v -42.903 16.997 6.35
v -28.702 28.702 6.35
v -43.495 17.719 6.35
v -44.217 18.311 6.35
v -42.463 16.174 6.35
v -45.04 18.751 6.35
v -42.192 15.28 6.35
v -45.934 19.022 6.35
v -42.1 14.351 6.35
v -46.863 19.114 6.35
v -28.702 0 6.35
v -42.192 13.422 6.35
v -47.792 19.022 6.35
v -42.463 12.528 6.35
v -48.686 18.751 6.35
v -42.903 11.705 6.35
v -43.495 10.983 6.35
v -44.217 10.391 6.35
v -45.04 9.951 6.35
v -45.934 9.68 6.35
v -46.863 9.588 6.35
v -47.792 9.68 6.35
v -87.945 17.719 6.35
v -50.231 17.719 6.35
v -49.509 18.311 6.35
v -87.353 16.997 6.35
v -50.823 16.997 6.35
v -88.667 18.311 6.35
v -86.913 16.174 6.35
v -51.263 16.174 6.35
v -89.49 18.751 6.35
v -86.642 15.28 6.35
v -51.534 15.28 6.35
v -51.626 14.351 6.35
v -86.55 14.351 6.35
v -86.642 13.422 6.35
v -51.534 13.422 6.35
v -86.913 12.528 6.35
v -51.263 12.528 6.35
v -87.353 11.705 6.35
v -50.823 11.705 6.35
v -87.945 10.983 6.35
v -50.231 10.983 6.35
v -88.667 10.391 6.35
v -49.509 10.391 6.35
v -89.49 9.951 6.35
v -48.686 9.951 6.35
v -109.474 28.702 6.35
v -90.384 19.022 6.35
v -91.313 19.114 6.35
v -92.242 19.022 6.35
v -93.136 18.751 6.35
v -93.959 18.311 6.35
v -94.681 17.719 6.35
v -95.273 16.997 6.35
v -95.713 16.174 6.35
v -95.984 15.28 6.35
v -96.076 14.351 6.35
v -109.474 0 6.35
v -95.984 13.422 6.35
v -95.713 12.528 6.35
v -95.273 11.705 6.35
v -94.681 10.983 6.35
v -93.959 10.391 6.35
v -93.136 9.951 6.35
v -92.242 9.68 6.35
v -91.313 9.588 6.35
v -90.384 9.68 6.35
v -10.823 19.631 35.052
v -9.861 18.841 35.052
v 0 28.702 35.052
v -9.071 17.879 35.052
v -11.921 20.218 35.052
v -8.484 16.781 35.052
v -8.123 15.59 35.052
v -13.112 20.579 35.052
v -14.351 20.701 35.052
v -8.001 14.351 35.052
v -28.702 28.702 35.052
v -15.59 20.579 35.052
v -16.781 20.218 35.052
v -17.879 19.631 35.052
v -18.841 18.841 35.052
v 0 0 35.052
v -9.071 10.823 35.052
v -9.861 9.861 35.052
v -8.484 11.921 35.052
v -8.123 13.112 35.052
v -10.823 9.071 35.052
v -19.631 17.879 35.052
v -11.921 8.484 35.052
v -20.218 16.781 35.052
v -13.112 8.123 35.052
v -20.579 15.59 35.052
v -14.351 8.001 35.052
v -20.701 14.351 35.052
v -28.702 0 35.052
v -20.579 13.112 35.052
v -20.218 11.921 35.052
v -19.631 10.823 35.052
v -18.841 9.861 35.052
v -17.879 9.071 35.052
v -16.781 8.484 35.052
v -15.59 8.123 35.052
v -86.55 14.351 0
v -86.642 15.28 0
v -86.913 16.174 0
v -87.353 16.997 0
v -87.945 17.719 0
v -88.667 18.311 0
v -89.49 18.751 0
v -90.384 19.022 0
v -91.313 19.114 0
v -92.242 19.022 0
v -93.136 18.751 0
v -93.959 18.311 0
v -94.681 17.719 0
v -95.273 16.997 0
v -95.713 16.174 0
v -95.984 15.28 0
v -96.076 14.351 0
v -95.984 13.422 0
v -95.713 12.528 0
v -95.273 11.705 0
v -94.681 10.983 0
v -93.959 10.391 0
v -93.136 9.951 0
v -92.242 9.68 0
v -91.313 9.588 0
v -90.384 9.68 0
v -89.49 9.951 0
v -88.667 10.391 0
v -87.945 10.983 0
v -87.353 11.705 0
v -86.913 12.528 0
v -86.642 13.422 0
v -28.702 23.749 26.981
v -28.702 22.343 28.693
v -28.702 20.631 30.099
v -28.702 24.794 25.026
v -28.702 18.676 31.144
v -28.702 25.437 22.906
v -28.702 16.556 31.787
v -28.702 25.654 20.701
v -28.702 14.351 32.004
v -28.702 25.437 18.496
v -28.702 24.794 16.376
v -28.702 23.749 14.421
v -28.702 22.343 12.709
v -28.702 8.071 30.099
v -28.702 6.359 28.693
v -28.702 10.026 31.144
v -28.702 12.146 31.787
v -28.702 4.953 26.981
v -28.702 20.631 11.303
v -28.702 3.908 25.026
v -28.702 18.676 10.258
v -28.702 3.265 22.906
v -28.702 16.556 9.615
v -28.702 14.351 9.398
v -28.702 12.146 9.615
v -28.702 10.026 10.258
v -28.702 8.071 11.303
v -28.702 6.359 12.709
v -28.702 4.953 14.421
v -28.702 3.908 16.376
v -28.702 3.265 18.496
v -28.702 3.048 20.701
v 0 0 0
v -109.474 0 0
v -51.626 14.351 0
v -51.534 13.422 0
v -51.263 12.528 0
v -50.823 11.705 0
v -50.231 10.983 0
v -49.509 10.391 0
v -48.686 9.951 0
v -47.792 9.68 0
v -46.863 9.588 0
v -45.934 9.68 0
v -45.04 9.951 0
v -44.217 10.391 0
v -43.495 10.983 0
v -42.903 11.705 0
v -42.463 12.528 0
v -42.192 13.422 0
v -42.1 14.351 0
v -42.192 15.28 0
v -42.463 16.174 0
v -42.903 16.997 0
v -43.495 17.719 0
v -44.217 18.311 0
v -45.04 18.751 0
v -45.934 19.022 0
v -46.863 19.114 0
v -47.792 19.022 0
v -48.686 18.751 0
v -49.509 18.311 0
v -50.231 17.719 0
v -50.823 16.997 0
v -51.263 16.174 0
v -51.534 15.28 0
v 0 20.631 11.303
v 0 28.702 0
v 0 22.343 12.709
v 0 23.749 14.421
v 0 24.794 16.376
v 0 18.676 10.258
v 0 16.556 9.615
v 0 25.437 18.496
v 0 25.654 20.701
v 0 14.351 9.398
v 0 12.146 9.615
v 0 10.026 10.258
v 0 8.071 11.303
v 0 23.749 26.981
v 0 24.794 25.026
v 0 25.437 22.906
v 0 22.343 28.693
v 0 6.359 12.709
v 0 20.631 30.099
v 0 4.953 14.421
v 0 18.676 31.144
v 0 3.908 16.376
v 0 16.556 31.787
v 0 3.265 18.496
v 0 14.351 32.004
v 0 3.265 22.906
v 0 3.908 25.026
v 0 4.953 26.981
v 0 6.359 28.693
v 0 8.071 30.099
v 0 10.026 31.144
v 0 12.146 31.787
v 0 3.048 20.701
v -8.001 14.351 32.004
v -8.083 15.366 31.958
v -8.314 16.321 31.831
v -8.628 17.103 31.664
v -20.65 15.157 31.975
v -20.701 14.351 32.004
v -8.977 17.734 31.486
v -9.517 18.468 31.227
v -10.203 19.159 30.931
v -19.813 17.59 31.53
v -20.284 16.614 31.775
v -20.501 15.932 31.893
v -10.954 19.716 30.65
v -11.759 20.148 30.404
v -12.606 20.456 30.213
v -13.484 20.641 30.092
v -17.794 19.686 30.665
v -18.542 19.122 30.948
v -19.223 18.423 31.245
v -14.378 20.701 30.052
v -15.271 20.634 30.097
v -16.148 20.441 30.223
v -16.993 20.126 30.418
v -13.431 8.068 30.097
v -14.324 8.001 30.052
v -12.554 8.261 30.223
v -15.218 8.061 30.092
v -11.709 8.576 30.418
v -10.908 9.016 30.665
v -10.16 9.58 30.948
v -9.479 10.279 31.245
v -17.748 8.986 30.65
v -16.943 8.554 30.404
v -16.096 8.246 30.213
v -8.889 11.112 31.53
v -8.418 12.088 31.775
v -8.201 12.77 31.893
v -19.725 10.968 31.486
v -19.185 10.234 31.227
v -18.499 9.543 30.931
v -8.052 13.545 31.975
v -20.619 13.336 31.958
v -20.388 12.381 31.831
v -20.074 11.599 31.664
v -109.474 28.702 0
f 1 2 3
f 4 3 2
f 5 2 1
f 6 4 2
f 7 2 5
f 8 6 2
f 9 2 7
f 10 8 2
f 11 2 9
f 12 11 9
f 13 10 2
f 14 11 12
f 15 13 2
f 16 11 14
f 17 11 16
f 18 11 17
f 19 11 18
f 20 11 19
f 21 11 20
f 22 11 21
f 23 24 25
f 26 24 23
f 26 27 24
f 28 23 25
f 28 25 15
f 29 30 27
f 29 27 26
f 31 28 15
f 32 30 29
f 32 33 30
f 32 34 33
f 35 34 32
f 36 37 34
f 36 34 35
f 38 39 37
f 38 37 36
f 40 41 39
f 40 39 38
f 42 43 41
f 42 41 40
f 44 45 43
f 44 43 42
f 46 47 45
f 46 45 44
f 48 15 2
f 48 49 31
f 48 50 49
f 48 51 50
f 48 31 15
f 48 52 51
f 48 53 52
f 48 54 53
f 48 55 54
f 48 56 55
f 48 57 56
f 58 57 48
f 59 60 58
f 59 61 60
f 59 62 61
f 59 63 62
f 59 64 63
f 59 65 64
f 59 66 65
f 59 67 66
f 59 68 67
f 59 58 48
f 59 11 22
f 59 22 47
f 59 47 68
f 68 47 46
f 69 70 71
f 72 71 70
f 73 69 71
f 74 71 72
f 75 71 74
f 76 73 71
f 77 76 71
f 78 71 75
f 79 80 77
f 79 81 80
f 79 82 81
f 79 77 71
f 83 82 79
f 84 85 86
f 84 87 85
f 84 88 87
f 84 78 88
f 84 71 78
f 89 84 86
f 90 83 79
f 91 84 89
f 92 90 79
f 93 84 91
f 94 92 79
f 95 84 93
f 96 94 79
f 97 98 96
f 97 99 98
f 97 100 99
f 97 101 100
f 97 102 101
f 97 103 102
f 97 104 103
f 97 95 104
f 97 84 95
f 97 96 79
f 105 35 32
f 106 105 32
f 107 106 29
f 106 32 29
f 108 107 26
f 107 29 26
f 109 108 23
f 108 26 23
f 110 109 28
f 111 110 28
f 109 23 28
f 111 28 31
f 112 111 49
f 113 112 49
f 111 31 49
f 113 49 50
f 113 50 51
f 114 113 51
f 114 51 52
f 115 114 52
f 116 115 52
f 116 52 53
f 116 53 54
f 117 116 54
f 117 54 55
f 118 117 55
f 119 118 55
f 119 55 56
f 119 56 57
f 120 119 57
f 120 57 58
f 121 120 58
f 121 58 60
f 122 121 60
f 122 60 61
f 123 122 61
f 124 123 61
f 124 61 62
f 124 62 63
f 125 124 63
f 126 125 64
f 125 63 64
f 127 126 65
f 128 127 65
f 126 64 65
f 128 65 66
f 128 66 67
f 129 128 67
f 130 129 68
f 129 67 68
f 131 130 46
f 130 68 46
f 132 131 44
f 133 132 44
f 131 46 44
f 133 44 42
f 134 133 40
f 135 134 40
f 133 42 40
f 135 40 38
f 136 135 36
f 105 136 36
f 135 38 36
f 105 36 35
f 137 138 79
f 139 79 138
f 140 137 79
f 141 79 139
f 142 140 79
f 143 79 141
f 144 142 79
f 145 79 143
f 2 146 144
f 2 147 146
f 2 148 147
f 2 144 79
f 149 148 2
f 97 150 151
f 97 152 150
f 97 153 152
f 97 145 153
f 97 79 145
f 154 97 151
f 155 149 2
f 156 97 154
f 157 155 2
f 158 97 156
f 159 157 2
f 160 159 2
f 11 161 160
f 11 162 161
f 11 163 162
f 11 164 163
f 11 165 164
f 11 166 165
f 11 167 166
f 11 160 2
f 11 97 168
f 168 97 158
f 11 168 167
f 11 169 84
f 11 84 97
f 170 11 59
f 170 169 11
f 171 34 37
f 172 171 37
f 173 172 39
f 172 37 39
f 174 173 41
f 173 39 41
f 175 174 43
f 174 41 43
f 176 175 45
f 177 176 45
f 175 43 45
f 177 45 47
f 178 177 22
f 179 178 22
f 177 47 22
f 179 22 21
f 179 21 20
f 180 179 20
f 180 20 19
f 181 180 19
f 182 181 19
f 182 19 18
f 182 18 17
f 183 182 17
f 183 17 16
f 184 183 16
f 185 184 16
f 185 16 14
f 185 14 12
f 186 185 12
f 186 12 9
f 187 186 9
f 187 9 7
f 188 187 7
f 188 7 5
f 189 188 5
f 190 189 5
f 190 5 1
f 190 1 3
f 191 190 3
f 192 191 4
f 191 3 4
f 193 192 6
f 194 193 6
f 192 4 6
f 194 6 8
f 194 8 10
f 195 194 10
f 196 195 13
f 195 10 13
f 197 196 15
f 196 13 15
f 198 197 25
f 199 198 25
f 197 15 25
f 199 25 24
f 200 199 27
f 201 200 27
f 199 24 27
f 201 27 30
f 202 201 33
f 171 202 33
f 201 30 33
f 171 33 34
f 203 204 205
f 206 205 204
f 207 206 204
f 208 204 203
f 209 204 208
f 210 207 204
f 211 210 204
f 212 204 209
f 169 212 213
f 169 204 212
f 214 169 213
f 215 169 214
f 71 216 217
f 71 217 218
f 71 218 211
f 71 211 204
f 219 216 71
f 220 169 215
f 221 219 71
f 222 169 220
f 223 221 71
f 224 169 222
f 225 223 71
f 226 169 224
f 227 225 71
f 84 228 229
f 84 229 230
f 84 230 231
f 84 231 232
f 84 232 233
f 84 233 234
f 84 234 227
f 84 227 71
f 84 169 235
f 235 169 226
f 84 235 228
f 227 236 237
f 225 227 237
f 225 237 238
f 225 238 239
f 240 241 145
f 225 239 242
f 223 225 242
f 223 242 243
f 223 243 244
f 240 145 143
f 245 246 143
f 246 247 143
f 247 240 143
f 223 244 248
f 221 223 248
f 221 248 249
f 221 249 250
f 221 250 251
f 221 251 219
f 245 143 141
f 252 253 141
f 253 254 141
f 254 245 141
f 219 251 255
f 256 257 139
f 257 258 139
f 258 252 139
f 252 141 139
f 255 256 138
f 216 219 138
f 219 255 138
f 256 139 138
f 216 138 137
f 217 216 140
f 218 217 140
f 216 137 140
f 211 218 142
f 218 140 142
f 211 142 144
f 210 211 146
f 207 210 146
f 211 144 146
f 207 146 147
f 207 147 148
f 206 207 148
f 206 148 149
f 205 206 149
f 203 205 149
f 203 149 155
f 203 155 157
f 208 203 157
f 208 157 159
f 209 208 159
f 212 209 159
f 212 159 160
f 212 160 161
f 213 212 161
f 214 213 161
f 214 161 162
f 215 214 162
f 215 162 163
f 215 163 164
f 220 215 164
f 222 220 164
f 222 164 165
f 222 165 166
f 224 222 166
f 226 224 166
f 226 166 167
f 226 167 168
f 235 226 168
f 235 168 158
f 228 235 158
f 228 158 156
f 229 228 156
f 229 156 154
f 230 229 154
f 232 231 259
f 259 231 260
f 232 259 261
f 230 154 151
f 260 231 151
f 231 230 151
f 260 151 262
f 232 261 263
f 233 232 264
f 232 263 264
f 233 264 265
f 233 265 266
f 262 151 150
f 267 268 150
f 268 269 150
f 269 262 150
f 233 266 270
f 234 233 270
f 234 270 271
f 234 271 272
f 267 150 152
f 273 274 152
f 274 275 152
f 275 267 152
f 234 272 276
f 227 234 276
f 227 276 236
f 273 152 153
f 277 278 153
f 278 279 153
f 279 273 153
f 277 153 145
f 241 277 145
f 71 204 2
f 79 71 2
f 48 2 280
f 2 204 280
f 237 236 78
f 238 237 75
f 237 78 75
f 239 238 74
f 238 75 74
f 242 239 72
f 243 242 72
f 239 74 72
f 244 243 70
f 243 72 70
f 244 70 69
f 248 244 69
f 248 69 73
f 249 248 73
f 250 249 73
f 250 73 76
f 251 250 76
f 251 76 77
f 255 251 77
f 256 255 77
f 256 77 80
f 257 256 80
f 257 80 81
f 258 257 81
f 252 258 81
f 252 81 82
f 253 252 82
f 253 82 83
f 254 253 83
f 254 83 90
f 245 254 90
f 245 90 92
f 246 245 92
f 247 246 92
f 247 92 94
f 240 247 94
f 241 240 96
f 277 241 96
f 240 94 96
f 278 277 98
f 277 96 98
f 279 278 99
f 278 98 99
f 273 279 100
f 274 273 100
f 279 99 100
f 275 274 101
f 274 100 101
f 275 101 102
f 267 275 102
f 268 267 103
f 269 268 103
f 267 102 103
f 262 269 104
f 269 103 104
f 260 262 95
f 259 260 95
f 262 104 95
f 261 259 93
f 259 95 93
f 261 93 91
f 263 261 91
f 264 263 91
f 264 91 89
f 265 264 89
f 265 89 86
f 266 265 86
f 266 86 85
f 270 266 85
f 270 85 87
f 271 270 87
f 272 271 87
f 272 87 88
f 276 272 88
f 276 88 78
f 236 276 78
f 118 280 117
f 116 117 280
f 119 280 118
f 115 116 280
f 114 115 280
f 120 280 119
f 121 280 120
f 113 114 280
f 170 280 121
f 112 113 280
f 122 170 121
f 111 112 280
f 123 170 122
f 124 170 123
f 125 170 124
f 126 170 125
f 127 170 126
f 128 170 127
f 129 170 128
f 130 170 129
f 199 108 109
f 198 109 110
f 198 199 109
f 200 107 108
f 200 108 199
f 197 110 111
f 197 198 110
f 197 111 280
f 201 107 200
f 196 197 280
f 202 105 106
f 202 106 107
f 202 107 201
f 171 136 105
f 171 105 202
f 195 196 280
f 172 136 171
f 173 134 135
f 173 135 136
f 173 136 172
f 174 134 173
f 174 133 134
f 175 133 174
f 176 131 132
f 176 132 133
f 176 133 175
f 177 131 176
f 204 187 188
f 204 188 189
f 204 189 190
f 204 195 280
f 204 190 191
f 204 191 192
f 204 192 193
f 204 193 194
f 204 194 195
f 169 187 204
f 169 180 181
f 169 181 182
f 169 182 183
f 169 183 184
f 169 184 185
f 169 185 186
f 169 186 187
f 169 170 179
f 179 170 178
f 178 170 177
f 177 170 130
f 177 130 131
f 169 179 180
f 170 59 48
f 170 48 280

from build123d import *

# Parameters (mm, degrees)
EXTRUDE1_DEPTH = 28.702
SKETCH2_R      = 11.303
EXTRUDE2_DEPTH = 93.609737566
SKETCH3_R      = 6.35
EXTRUDE3_DEPTH = 12.7
SKETCH4_R      = 4.7625
EXTRUDE4_DEPTH = 117.756868277


with BuildPart() as part:
    # Sketch1 → Extrude1 (new body)
    with BuildSketch(Plane(origin=(0, 0, 0), x_dir=(1, 0, 0), z_dir=(0, 1, 0))):
        Polygon((0, 0), (0, -35.052), (-28.702, -35.052), (-28.702, -6.35), (-109.474, -6.35), (-109.474, 0), align=None)
    extrude(amount=EXTRUDE1_DEPTH)

    # Sketch2 → Extrude2 (cut, through all)
    with BuildSketch(Plane.ZY.offset(28.702)):
        with Locations((20.701, 14.351)):
            Circle(SKETCH2_R)
    extrude(amount=-EXTRUDE2_DEPTH, mode=Mode.SUBTRACT)

    # Sketch3 → Extrude3 (cut)
    with BuildSketch(Plane.XY.offset(35.052)):
        with Locations((-14.351, 14.351)):
            Circle(SKETCH3_R)
    extrude(amount=-EXTRUDE3_DEPTH, mode=Mode.SUBTRACT)

    # Sketch4 → Extrude4 (cut, through all)
    with BuildSketch(Plane.XY.offset(6.35)):
        with Locations((-91.313, 14.351)):
            Circle(SKETCH4_R)
        with Locations(Location((-46.863, 14.351, 0), (0, 0, 180))):
            Circle(SKETCH4_R)
    extrude(amount=-EXTRUDE4_DEPTH, mode=Mode.SUBTRACT)


solid = part.part
